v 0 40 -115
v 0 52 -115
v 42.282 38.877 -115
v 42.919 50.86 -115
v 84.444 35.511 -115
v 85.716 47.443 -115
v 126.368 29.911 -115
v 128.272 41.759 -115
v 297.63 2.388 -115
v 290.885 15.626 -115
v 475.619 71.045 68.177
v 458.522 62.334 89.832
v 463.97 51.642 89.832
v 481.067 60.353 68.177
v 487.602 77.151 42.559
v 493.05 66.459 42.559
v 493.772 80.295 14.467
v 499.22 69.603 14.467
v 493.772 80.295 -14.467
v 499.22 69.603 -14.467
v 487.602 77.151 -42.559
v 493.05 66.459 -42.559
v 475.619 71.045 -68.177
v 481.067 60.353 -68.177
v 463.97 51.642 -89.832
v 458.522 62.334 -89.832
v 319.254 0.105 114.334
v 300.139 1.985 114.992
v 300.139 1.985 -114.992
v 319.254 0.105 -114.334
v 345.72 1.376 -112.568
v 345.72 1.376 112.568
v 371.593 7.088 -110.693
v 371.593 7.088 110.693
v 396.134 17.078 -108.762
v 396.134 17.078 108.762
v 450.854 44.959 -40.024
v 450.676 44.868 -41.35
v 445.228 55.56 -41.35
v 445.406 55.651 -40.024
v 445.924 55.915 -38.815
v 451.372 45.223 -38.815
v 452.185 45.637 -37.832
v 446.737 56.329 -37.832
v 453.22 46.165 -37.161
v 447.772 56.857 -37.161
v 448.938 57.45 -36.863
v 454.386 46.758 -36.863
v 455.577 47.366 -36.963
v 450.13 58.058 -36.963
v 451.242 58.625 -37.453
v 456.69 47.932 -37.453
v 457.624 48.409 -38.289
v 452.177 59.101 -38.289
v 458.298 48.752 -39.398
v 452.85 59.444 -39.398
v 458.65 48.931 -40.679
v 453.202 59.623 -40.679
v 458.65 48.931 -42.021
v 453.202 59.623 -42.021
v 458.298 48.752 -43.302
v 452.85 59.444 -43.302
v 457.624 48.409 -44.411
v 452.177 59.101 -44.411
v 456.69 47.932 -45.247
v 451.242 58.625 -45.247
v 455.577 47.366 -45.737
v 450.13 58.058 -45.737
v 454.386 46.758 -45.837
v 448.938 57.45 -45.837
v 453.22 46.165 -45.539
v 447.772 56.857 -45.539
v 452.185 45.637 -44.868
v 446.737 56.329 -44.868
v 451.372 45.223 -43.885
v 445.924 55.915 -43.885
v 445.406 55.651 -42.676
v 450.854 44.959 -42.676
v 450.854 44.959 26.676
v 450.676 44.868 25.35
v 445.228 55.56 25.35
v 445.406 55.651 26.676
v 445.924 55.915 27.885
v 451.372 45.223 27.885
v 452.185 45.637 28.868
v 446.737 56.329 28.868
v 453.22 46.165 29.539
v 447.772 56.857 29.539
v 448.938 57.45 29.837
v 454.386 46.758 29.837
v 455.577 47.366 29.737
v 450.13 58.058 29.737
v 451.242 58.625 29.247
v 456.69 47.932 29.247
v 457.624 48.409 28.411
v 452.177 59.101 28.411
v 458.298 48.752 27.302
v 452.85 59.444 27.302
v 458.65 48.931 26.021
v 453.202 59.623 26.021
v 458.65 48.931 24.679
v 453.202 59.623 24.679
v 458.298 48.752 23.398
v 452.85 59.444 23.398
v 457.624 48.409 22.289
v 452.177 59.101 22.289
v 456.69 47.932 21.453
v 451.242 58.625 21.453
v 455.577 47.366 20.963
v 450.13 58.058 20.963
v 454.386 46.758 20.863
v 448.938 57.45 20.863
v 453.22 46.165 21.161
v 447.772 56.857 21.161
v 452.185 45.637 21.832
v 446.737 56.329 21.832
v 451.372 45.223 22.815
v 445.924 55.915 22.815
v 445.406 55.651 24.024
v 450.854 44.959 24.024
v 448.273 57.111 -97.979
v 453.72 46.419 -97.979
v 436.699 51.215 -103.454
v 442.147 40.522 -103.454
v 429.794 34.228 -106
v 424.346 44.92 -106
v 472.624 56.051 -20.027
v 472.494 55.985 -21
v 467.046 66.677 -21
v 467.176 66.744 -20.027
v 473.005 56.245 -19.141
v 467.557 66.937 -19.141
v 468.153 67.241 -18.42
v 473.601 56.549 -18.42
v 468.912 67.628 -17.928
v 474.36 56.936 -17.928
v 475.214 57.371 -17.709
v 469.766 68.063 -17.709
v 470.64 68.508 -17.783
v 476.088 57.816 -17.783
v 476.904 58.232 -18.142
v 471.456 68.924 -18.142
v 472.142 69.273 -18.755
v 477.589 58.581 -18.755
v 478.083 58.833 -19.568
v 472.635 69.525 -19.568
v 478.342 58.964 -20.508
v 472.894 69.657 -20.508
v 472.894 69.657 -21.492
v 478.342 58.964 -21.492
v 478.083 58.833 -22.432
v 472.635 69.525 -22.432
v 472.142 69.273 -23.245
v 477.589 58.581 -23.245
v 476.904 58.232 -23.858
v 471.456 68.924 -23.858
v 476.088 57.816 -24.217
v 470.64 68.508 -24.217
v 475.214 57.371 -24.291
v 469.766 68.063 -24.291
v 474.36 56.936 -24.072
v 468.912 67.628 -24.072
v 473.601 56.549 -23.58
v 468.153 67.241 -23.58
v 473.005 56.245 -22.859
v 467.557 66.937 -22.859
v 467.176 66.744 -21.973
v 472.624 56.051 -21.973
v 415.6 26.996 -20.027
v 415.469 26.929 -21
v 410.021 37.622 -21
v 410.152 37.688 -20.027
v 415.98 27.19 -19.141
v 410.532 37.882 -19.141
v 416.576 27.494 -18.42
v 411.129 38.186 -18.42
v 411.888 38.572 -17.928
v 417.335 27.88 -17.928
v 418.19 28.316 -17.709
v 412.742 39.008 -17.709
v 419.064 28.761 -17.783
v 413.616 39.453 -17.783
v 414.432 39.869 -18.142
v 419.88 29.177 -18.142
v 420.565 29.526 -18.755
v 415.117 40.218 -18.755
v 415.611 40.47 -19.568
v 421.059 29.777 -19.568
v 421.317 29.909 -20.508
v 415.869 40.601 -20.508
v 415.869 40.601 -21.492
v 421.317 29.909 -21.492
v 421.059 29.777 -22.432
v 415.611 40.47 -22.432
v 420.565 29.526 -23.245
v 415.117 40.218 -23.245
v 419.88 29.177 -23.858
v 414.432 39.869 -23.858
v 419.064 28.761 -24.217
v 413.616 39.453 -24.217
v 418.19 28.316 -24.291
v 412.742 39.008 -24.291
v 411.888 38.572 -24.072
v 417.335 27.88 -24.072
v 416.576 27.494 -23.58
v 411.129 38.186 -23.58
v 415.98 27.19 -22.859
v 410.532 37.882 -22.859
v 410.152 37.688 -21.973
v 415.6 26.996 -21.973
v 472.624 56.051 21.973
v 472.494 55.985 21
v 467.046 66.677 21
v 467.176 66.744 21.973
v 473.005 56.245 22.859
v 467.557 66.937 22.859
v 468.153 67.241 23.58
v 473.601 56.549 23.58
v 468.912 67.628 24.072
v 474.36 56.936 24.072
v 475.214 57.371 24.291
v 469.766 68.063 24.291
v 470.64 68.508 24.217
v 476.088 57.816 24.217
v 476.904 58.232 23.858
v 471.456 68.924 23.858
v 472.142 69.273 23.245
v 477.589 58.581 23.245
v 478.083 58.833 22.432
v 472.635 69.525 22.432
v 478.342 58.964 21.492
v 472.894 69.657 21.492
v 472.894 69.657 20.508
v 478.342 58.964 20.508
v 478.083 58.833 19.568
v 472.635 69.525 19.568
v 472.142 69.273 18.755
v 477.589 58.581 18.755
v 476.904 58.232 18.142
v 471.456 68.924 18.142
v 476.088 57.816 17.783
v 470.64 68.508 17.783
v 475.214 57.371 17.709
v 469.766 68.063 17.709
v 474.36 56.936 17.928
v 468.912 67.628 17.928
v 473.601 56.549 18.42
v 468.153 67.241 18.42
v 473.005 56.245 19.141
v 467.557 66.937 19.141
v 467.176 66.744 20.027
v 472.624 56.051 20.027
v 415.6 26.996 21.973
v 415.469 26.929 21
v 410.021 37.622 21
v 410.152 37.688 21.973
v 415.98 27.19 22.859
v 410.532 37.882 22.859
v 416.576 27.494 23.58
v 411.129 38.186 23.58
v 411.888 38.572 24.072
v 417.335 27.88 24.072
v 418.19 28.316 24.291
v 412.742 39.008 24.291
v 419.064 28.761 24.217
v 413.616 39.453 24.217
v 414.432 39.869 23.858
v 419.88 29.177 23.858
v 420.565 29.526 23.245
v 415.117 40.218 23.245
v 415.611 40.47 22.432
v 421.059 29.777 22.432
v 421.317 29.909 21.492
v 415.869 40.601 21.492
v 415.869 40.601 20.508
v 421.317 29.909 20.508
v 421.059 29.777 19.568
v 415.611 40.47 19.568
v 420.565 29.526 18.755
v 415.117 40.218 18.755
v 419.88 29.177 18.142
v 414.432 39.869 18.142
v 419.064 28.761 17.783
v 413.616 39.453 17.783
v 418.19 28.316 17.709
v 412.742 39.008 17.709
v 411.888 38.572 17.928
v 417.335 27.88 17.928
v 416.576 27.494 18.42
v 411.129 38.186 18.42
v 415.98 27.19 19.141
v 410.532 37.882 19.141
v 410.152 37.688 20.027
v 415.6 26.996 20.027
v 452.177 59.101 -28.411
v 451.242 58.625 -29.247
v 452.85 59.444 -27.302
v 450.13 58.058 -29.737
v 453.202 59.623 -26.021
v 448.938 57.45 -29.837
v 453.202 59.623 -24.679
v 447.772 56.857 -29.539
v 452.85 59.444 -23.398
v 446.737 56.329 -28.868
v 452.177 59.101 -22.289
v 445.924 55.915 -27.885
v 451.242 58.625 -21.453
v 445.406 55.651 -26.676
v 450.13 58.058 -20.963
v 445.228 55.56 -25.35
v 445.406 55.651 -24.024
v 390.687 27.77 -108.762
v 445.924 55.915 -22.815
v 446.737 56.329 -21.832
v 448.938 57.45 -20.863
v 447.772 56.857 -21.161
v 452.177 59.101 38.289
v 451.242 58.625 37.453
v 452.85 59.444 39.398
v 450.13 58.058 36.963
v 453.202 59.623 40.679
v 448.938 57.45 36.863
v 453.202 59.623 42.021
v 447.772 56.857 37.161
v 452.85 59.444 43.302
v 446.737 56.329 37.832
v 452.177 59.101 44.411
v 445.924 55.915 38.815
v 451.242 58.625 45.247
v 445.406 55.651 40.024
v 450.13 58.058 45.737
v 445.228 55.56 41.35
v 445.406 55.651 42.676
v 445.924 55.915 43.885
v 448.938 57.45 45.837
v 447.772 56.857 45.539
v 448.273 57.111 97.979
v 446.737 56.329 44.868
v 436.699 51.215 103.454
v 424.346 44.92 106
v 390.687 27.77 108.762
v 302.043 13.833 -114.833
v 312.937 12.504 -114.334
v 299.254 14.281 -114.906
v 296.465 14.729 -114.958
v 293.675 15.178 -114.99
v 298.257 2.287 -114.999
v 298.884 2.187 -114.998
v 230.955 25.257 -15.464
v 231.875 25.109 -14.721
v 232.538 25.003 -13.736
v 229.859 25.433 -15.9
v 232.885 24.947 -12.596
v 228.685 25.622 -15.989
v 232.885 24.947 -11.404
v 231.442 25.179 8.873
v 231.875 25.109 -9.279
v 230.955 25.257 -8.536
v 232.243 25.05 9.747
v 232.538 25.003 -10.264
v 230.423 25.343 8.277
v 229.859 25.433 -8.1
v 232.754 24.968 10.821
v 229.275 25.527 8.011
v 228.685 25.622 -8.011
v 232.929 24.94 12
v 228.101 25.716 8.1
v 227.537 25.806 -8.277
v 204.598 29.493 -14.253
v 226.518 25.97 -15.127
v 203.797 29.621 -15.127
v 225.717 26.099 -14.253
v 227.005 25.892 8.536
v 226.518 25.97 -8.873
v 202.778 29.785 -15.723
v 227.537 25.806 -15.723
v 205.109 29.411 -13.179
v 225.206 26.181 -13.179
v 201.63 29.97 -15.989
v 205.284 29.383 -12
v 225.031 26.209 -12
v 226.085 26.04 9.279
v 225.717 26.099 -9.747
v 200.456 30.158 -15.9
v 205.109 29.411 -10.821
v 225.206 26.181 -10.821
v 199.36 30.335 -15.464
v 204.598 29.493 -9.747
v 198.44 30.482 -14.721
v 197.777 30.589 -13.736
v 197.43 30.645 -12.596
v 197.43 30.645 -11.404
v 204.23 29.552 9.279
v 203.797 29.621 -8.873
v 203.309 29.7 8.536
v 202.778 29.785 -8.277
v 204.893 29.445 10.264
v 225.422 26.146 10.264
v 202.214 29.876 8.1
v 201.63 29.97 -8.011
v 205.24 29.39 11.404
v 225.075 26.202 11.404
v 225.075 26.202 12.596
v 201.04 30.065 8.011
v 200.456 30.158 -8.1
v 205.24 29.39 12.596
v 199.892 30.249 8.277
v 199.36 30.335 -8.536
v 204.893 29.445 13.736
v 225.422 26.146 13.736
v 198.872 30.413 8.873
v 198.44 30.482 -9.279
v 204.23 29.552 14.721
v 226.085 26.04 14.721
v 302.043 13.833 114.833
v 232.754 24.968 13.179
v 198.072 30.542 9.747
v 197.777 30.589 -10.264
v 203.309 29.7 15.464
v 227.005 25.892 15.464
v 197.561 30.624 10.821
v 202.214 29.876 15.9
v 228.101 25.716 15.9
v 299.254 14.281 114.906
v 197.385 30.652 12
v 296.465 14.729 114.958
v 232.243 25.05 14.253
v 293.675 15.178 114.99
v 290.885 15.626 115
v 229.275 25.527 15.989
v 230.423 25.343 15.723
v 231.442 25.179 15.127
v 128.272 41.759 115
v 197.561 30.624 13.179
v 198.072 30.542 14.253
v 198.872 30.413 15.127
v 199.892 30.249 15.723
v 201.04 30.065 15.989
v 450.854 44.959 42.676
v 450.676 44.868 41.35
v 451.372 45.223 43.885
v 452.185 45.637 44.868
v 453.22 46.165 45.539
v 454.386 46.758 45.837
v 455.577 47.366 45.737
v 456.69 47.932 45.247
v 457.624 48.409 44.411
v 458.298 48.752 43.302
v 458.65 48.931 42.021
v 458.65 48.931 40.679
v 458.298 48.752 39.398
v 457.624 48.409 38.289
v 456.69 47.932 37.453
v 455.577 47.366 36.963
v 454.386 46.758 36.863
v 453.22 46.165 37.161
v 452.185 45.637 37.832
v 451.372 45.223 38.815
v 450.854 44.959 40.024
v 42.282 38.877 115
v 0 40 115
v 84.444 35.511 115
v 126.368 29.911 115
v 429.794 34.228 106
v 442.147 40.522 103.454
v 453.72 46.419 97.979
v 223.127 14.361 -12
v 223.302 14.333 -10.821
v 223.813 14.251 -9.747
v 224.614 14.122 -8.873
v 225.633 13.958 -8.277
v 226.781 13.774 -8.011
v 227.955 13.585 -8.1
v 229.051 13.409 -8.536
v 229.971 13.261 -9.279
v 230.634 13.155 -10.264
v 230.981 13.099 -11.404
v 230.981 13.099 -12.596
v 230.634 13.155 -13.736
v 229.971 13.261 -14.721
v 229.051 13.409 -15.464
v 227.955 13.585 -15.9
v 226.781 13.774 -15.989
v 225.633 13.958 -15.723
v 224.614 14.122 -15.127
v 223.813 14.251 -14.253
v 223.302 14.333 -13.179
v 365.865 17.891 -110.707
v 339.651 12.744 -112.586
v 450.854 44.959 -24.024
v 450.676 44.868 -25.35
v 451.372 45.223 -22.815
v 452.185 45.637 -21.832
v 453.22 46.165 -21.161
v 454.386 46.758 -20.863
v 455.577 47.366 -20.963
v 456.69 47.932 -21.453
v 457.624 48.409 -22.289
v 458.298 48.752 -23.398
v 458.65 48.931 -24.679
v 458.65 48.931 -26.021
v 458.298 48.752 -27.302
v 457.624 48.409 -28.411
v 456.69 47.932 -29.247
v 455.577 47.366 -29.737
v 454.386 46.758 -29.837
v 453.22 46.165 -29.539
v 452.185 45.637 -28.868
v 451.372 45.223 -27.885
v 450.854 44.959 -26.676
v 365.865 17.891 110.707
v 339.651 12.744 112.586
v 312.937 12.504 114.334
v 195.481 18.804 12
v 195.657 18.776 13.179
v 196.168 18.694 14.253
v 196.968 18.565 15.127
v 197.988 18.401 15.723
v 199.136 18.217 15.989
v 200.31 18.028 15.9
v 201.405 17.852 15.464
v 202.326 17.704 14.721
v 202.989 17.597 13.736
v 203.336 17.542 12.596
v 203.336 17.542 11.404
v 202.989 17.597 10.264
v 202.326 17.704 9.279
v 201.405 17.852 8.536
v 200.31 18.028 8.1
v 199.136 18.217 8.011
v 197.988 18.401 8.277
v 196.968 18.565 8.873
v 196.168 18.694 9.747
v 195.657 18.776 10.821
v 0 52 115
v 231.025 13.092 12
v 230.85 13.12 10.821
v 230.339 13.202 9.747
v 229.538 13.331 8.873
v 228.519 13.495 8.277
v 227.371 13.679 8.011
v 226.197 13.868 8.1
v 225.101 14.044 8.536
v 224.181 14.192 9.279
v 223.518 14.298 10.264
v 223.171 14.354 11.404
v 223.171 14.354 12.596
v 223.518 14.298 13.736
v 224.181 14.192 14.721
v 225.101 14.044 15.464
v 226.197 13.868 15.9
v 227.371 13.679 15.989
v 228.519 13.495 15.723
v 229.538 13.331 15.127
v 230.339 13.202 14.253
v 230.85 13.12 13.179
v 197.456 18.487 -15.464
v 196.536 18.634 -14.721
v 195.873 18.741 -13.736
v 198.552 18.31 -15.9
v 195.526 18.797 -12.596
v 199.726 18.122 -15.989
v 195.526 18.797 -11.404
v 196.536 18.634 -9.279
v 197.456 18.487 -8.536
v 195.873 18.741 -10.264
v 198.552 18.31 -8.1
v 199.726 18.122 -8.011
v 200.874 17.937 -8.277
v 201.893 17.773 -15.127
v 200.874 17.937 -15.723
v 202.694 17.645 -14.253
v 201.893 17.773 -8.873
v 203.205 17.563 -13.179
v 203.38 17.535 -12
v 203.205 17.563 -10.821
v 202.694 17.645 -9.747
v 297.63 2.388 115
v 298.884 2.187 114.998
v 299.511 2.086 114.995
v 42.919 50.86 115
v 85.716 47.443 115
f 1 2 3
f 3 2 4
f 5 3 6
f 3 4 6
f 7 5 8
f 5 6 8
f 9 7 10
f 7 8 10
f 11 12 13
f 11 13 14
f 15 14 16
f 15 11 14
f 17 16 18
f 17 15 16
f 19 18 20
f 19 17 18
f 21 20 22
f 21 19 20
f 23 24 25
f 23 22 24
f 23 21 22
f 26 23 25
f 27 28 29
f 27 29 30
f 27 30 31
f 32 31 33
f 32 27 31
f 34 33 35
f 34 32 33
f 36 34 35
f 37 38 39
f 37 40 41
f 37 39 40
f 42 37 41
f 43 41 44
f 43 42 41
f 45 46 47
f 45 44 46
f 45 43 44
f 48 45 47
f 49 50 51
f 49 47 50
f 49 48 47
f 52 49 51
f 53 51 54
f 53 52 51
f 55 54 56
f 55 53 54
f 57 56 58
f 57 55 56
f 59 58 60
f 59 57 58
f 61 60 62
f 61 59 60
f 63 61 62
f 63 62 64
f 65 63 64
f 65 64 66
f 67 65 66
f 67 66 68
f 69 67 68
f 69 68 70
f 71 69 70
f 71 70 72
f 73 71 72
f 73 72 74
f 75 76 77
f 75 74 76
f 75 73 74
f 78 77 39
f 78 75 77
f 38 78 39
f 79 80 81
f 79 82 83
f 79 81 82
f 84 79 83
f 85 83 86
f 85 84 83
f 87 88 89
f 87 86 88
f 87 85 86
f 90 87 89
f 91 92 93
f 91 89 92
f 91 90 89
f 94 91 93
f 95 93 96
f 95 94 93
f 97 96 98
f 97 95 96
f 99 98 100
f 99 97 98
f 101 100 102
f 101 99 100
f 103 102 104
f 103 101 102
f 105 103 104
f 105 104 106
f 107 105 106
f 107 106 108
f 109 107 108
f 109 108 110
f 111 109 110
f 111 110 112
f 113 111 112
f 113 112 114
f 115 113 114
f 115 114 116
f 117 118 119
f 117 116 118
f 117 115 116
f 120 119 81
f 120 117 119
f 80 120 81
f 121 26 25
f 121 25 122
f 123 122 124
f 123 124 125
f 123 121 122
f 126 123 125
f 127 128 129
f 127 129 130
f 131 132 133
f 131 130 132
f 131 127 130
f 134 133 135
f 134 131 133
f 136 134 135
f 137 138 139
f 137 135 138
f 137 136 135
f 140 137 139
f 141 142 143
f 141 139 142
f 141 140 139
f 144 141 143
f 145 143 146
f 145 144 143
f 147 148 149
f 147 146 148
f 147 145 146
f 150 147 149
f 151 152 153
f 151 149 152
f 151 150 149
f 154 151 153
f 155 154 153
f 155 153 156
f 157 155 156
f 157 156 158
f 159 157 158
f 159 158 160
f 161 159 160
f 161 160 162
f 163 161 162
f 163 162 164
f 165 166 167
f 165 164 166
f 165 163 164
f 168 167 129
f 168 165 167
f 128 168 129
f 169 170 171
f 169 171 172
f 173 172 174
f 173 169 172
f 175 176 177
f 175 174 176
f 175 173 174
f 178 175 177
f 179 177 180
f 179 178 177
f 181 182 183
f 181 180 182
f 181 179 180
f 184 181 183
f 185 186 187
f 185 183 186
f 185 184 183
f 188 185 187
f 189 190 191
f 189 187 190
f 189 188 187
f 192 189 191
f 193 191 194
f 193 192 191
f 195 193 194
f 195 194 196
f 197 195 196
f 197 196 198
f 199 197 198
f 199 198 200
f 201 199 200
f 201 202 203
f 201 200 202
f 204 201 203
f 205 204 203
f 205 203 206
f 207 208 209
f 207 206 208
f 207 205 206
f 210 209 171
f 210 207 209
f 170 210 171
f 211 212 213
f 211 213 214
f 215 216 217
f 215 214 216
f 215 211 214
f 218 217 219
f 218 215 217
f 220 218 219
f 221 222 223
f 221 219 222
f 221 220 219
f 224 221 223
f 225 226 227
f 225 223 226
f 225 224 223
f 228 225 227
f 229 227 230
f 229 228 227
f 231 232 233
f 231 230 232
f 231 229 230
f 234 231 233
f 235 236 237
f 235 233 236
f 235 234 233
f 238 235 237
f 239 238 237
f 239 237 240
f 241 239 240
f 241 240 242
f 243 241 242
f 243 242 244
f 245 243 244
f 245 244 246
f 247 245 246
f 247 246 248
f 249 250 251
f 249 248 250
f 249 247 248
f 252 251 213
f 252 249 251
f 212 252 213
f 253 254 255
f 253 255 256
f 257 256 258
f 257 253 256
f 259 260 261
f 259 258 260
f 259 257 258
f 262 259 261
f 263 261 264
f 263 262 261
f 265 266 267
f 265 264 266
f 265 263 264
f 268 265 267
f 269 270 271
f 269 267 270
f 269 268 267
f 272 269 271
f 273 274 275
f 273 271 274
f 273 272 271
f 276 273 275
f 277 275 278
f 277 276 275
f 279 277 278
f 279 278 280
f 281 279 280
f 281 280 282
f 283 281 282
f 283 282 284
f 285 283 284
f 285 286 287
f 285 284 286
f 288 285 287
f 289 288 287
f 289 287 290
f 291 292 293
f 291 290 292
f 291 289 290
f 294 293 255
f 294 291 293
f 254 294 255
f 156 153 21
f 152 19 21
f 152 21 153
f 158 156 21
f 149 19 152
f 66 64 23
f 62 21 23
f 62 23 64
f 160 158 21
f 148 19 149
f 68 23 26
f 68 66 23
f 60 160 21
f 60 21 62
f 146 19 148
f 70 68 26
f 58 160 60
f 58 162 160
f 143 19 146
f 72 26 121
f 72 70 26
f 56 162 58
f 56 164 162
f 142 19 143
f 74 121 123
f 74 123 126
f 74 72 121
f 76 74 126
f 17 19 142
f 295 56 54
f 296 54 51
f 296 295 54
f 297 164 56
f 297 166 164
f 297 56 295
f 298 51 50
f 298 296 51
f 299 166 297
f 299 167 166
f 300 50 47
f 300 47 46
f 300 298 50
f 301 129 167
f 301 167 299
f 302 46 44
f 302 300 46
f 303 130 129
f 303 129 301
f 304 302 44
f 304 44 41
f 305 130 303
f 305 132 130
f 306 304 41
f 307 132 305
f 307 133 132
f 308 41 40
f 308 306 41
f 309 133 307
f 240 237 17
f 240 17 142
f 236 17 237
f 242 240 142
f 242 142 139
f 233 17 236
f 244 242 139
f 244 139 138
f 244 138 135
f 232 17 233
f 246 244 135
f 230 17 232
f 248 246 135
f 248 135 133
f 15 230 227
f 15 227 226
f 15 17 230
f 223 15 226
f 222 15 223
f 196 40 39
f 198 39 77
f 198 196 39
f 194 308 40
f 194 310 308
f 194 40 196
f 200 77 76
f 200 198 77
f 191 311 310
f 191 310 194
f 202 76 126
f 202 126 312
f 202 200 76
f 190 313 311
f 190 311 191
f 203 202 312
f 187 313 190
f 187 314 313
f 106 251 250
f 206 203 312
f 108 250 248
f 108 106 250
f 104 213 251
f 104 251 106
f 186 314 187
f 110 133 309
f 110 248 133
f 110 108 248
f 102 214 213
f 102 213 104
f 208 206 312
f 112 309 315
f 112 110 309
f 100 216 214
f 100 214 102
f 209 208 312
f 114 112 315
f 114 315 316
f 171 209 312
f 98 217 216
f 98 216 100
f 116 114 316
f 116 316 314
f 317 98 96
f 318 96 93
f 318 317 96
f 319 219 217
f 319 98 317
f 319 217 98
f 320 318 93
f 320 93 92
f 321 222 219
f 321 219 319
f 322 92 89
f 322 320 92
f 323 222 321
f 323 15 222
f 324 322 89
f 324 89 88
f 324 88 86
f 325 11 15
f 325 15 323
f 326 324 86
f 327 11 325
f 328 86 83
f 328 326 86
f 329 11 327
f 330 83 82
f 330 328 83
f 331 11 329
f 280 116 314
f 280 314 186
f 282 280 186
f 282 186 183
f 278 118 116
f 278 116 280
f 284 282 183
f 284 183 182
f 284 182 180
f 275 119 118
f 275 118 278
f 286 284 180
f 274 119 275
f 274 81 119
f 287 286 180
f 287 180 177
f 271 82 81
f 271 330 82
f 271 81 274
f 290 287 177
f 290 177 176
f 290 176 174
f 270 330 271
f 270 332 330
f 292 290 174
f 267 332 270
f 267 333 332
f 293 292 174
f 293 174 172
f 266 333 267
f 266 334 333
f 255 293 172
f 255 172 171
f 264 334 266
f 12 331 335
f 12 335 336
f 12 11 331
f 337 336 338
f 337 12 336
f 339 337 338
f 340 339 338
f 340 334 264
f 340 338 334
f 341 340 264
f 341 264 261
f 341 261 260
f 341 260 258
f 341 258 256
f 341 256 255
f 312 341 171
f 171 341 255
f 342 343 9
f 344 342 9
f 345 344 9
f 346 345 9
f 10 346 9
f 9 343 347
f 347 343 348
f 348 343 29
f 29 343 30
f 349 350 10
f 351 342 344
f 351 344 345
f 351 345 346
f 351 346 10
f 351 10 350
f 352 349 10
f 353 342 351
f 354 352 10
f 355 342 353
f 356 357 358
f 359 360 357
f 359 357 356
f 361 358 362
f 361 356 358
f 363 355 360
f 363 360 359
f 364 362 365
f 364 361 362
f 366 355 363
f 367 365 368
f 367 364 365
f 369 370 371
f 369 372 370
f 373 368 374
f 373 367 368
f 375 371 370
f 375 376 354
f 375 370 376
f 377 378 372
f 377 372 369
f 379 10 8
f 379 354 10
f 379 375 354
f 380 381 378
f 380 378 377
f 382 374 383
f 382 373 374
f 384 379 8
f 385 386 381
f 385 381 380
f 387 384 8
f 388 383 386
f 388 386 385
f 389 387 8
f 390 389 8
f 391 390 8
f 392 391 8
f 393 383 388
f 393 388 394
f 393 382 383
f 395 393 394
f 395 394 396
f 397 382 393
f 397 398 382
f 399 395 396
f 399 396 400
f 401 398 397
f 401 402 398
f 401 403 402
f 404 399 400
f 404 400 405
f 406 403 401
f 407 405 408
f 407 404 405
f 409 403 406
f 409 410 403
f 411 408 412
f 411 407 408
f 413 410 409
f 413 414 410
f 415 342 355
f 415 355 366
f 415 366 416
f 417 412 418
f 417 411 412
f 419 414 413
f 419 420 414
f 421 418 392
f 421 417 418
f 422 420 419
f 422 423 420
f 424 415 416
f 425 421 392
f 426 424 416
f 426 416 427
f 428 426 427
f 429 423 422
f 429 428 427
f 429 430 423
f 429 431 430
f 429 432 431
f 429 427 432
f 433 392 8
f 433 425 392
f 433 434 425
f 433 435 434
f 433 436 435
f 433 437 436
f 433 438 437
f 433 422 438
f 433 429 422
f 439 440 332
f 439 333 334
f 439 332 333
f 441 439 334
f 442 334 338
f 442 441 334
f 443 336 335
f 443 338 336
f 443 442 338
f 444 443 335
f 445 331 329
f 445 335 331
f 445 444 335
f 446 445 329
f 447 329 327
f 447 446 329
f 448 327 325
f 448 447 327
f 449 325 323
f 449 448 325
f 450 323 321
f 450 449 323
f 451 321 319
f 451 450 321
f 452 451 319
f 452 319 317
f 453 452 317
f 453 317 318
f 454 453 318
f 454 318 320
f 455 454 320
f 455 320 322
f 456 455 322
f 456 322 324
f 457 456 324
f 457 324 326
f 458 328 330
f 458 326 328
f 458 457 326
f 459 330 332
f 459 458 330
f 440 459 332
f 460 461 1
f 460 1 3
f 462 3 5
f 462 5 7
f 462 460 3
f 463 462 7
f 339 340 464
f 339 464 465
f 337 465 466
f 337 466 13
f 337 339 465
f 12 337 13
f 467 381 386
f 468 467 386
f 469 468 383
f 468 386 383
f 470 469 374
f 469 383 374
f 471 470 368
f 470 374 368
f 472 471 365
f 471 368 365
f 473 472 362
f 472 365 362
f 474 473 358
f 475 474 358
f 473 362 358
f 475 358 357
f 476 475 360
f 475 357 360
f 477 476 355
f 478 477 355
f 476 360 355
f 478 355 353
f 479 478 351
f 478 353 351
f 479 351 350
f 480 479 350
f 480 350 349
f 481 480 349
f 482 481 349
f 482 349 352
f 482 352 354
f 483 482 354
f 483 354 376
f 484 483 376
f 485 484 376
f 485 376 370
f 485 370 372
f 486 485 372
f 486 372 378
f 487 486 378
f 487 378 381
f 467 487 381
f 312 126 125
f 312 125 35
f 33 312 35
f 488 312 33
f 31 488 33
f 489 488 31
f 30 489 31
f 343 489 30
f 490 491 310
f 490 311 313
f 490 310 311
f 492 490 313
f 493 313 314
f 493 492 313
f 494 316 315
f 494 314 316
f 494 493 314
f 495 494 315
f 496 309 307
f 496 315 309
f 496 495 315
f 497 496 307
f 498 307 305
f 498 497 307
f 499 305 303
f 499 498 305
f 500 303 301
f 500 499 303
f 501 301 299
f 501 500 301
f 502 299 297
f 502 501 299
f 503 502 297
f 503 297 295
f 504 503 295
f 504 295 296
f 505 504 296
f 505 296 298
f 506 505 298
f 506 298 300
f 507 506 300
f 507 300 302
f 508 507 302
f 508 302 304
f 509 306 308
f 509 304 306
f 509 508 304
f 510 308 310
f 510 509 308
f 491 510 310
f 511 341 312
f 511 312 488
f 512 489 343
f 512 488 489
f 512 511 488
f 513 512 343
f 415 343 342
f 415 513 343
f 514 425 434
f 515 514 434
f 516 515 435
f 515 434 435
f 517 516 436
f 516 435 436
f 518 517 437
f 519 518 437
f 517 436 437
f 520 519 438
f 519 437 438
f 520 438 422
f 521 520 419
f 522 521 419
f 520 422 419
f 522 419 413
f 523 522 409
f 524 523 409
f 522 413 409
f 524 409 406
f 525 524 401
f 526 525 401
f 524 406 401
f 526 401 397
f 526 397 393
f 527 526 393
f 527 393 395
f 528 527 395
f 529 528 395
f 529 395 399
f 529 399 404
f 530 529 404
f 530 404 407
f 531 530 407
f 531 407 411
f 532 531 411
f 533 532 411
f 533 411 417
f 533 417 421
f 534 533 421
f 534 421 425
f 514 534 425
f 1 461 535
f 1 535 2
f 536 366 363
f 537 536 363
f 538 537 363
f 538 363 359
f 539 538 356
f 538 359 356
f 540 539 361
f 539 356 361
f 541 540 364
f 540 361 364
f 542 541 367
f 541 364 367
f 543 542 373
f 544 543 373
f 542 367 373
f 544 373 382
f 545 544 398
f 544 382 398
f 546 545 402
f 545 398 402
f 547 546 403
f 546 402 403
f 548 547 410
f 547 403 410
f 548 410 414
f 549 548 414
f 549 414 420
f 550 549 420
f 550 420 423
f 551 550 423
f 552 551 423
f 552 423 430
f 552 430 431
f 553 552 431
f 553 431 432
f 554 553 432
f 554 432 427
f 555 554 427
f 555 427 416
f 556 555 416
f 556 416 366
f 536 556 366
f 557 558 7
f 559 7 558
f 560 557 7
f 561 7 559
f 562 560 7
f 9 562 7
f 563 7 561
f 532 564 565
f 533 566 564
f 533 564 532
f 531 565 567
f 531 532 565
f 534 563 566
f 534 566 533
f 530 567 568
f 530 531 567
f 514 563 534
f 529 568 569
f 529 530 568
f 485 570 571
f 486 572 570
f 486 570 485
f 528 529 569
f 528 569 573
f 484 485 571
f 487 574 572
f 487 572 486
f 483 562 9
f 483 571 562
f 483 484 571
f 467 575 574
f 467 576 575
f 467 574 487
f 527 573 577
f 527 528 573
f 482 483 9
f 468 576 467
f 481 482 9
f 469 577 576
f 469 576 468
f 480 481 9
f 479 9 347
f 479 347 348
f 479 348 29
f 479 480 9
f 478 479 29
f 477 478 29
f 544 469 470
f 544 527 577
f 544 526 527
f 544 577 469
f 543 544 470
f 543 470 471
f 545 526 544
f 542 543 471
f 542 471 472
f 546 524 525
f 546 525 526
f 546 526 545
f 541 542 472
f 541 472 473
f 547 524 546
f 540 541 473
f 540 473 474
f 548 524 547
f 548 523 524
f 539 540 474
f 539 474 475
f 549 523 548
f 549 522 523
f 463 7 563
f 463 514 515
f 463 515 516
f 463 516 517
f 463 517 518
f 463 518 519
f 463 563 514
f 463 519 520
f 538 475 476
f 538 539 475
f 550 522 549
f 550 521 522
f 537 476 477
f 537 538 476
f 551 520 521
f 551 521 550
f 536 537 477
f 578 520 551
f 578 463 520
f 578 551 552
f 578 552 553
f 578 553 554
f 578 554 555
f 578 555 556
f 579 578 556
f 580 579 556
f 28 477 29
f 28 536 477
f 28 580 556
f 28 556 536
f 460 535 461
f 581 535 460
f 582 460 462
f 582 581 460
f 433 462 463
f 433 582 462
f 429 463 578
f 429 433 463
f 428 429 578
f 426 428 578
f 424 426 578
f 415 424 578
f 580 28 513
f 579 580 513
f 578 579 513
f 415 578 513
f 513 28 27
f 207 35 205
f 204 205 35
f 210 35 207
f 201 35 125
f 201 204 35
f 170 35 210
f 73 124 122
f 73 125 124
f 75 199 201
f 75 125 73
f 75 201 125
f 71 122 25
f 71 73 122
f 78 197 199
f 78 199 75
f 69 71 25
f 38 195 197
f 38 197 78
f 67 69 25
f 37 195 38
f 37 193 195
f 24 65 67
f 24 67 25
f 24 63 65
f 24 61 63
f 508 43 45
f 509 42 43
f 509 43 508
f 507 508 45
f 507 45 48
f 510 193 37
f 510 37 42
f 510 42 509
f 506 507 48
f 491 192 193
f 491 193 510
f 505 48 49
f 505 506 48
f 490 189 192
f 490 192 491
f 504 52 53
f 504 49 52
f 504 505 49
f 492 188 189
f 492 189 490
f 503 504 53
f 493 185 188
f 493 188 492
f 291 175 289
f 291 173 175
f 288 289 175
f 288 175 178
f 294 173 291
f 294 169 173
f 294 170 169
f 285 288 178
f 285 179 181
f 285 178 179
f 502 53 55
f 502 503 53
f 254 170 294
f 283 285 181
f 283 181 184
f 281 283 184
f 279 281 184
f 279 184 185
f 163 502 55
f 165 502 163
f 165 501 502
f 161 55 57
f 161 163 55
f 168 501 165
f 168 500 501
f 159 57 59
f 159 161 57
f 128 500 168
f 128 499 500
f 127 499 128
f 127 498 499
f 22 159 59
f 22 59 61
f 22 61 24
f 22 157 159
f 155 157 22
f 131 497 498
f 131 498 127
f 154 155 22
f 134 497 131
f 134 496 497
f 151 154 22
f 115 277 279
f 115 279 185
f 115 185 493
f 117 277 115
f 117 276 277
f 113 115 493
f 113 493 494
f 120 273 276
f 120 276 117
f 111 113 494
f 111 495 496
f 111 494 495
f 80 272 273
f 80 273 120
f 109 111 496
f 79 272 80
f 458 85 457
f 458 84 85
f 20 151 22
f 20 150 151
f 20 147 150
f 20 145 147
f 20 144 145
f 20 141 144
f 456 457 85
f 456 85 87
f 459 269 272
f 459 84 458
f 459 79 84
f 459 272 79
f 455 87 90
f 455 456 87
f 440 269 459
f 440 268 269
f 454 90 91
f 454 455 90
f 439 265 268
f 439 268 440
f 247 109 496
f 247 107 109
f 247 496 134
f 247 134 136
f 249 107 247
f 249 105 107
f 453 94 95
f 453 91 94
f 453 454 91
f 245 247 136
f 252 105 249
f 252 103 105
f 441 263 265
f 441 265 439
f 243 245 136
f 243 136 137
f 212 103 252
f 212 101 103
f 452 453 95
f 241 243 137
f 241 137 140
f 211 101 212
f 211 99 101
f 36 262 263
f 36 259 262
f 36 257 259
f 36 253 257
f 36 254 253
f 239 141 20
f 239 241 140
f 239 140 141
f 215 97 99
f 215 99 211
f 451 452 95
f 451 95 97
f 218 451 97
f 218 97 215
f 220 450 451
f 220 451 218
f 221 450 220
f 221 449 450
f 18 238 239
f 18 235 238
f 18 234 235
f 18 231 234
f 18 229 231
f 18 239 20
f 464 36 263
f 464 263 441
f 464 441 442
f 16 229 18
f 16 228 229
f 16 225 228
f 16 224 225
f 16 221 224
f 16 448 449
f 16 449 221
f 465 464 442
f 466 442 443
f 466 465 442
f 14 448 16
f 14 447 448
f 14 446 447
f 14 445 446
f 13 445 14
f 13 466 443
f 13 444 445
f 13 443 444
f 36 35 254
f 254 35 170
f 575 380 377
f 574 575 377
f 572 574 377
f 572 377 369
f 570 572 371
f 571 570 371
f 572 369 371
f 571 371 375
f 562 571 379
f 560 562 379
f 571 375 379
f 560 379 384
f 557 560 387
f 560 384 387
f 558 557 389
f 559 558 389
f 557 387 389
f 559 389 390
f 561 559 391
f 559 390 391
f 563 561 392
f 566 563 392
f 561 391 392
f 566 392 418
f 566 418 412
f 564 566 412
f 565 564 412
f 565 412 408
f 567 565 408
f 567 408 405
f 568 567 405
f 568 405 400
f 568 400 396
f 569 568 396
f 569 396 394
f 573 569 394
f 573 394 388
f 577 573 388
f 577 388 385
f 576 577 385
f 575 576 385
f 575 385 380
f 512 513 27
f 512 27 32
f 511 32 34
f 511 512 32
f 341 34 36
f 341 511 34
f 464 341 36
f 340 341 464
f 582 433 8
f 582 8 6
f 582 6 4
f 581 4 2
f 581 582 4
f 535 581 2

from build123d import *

# Parameters (mm, degrees)
EXTRUDE_THIN1_DEPTH  = 115
CUT_EXTRUDE1_DEPTH   = 620.892995583
FILLET1_R            = 250
SKETCH3_R            = 4
BINDING_HOLES_DEPTH  = 527.107084161
SKETCH4_R            = 4
CUT_EXTRUDE2_DEPTH   = 947.891927405
M6_CLEARANCE_HOLE1_D = 6.6
M8_CLEARANCE_HOLE1_D = 9
SKETCH9_W            = 500
SKETCH9_H            = 230
CUT_EXTRUDE3_DEPTH   = 520.361349661


with BuildPart() as part:
    # Sketch1 → Extrude-Thin1 (new, symmetric)
    with BuildSketch(Plane.XY):
        with BuildLine():
            Line((-500, 70), (-396.134492808, 17.077880761))
            ThreePointArc((-396.134492808, 17.077880761), (-349.336150967, 1.90144375), (-300.138569045, 1.984944587))
            Line((-300.138569045, 1.984944587), (-126.368172253, 29.91072477))
            ThreePointArc((-126.368172253, 29.91072477), (0, 40), (126.368172253, 29.91072477))
            Line((126.368172253, 29.91072477), (300.138569045, 1.984944587))
            ThreePointArc((300.138569045, 1.984944587), (349.336150967, 1.90144375), (396.134492808, 17.077880761))
            Line((396.134492808, 17.077880761), (500, 70))
            Line((500, 70), (494.552114003, 80.69207829))
            Line((494.552114003, 80.69207829), (390.686606812, 27.769959051))
            ThreePointArc((390.686606812, 27.769959051), (347.472349444, 13.755820321), (302.042599512, 13.832926187))
            Line((302.042599512, 13.832926187), (128.27220272, 41.75870637))
            ThreePointArc((128.27220272, 41.75870637), (0, 52), (-128.27220272, 41.75870637))
            Line((-128.27220272, 41.75870637), (-302.042599512, 13.832926187))
            ThreePointArc((-302.042599512, 13.832926187), (-347.472349444, 13.755820321), (-390.686606812, 27.769959051))
            Line((-390.686606812, 27.769959051), (-494.552114003, 80.69207829))
            Line((-494.552114003, 80.69207829), (-500, 70))
        make_face()
    extrude(amount=EXTRUDE_THIN1_DEPTH, both=True)

    # Sketch2 → Cut-Extrude1 (cut, symmetric)
    with BuildSketch(Plane(origin=(-69.290206127, -135.989686473, 0), x_dir=(-0.8910065241883677, 0.4539904997395473, 0), z_dir=(0.45399049973954725, 0.8910065241883676, 0))):
        with BuildLine():
            Line((-1243.954382633, 226.09395148), (275.40194382, 115))
            Line((275.40194382, 115), (398.488815391, 106))
            ThreePointArc((398.488815391, 106), (418.996120575, 101.069384919), (436.845066451, 89.8321405))
            ThreePointArc((436.845066451, 89.8321405), (477.282597076, 0), (436.845066451, -89.8321405))
            ThreePointArc((436.845066451, -89.8321405), (418.996120575, -101.069384919), (398.488815391, -106))
            Line((398.488815391, -106), (275.40194382, -115))
            Line((275.40194382, -115), (-1243.954382633, -226.09395148))
            Line((-1243.954382633, -226.09395148), (1802.870530478, -226.09395148))
            Line((1802.870530478, -226.09395148), (1802.870530478, 226.09395148))
            Line((1802.870530478, 226.09395148), (-1243.954382633, 226.09395148))
        make_face()
    cut_extrude1 = extrude(amount=CUT_EXTRUDE1_DEPTH, both=True, mode=Mode.SUBTRACT)

    # Mirror1: Cut-Extrude1 across plane
    add(cut_extrude1.mirror(Plane(origin=(0, 0, 0), x_dir=(0, 0, 1), z_dir=(1, 0, 0))), mode=Mode.SUBTRACT)

    # Fillet1
    # the kernel refuses this fillet: 250 mm, written as the material it takes off along each edge
    with BuildSketch(Plane(origin=(-319.014996724, -19.477278886, 115), x_dir=(-0.8886341933277065, 0.4527817367914195, -0.07292440796442752), z_dir=(0.45399049973954736, 0.8910065241883677, 0))) as fillet1_piece_1:
        with BuildLine():
            CenterArc((FILLET1_R * 0.0365108095299, -FILLET1_R), FILLET1_R, 90, 4.181973001)
            Line((-FILLET1_R * 0.0364135984345, -FILLET1_R * 0.00266252916927), (-FILLET1_R * 0.0378720865938, FILLET1_R * 0.0172842202473))
            Line((-FILLET1_R * 0.0378720865938, FILLET1_R * 0.0172842202473), (-FILLET1_R * 0.000730216190598, FILLET1_R * 0.02))
            Line((-FILLET1_R * 0.000730216190598, FILLET1_R * 0.02), (FILLET1_R * 0.0365108095299, FILLET1_R * 0.02))
            Line((FILLET1_R * 0.0365108095299, FILLET1_R * 0.02), (FILLET1_R * 0.0365108095299, 0))
        make_face()
    extrude(amount=60.204173091, mode=Mode.SUBTRACT)
    # the kernel refuses this fillet: 250 mm, written as the material it takes off along each edge
    with BuildSketch(Plane(origin=(319.014996724, -19.477278886, 115), x_dir=(-0.8910065241883677, -0.4539904997395473, 0), z_dir=(-0.45399049973954736, 0.8910065241883677, 0))) as fillet1_2_piece_1:
        with BuildLine():
            CenterArc((FILLET1_R * 0.0365108095299, -FILLET1_R), FILLET1_R, 90, 4.181973001)
            Line((-FILLET1_R * 0.0364135984345, -FILLET1_R * 0.00266252916927), (-FILLET1_R * 0.0378720865938, FILLET1_R * 0.0172842202473))
            Line((-FILLET1_R * 0.0378720865938, FILLET1_R * 0.0172842202473), (-FILLET1_R * 0.000730216190598, FILLET1_R * 0.02))
            Line((-FILLET1_R * 0.000730216190598, FILLET1_R * 0.02), (FILLET1_R * 0.0365108095299, FILLET1_R * 0.02))
            Line((FILLET1_R * 0.0365108095299, FILLET1_R * 0.02), (FILLET1_R * 0.0365108095299, 0))
        make_face()
    extrude(amount=60.204173091, mode=Mode.SUBTRACT)
    # the kernel refuses this fillet: 250 mm, written as the material it takes off along each edge
    with BuildSketch(Plane(origin=(-319.014996724, -19.477278886, -115), x_dir=(0.8910065241883677, -0.4539904997395473, 0), z_dir=(0.4539904997395473, 0.8910065241883677, 0))) as fillet1_3_piece_1:
        with BuildLine():
            CenterArc((FILLET1_R * 0.0365108095299, -FILLET1_R), FILLET1_R, 90, 4.181973001)
            Line((-FILLET1_R * 0.0364135984345, -FILLET1_R * 0.00266252916927), (-FILLET1_R * 0.0378720865938, FILLET1_R * 0.0172842202473))
            Line((-FILLET1_R * 0.0378720865938, FILLET1_R * 0.0172842202473), (-FILLET1_R * 0.000730216190598, FILLET1_R * 0.02))
            Line((-FILLET1_R * 0.000730216190598, FILLET1_R * 0.02), (FILLET1_R * 0.0365108095299, FILLET1_R * 0.02))
            Line((FILLET1_R * 0.0365108095299, FILLET1_R * 0.02), (FILLET1_R * 0.0365108095299, 0))
        make_face()
    extrude(amount=60.204173091, mode=Mode.SUBTRACT)
    # the kernel refuses this fillet: 250 mm, written as the material it takes off along each edge
    with BuildSketch(Plane(origin=(319.014996724, -19.477278886, -115), x_dir=(-0.8910065241883677, -0.4539904997395473, 0), z_dir=(-0.4539904997395473, 0.8910065241883677, 0))) as fillet1_4_piece_1:
        with BuildLine():
            CenterArc((FILLET1_R * 0.0365108095299, FILLET1_R), FILLET1_R, 265.818026999, 4.181973001)
            Line((-FILLET1_R * 0.0364135984345, FILLET1_R * 0.00266252916927), (-FILLET1_R * 0.0378720865938, -FILLET1_R * 0.0172842202473))
            Line((-FILLET1_R * 0.0378720865938, -FILLET1_R * 0.0172842202473), (-FILLET1_R * 0.000730216190598, -FILLET1_R * 0.02))
            Line((-FILLET1_R * 0.000730216190598, -FILLET1_R * 0.02), (FILLET1_R * 0.0365108095299, -FILLET1_R * 0.02))
            Line((FILLET1_R * 0.0365108095299, -FILLET1_R * 0.02), (FILLET1_R * 0.0365108095299, 0))
        make_face()
    extrude(amount=60.204173091, mode=Mode.SUBTRACT)

    # Sketch3 → Binding Holes (cut, through all)
    with BuildSketch(Plane(origin=(-9.771253847, 60.8024072, 0), x_dir=(-0.9873317999532861, -0.15866920558509276, 0), z_dir=(-0.15866920558509276, 0.9873317999532861, 0))):
        with Locations((222.02140403, 12)):
            Circle(SKETCH3_R)
        with Locations(Location((222.02140403, -12, 0), (0, 0, 180))):
            Circle(SKETCH3_R)
        with Locations((194.02140403, -12)):
            Circle(SKETCH3_R)
        with Locations(Location((194.02140403, 12, 0), (0, 0, 180))):
            Circle(SKETCH3_R)
    extrude(amount=-BINDING_HOLES_DEPTH, mode=Mode.SUBTRACT)

    # Sketch4 → Cut-Extrude2 (cut, through all)
    with BuildSketch(Plane(origin=(430.771006706, -6.854378838, -35.350500744), x_dir=(-0.9873317999532861, 0.15866920558509276, 0), z_dir=(0.15866920558509276, 0.9873317999532861, 0))):
        with Locations((232.380088234, 47.350500744)):
            Circle(SKETCH4_R)
        with Locations(Location((232.380088234, 23.350500744, 0), (0, 0, 180))):
            Circle(SKETCH4_R)
        with Locations((204.380088234, 23.350500744)):
            Circle(SKETCH4_R)
        with Locations(Location((204.380088234, 47.350500744, 0), (0, 0, 180))):
            Circle(SKETCH4_R)
    extrude(amount=-CUT_EXTRUDE2_DEPTH, mode=Mode.SUBTRACT)

    # M6 Clearance Hole1 (through all)
    with Locations(Plane(origin=(-49.331097603, -146.159360215, -63.345400331), x_dir=(-0.8910065241883677, 0.4539904997395473, 0), z_dir=(0.45399049973954725, 0.8910065241883676, 0))):
        with Locations((472.112244346, 84.345400331), (408.112244346, 84.345400331), (408.112244346, 42.345400331), (472.112244346, 42.345400331)):
            m6_clearance_hole1 = Hole(M6_CLEARANCE_HOLE1_D / 2)

    # M8 Clearance Hole1 (through all)
    with Locations(Plane(origin=(-70.616279149, -135.31401852, -54.210944478), x_dir=(-0.8910065241883677, 0.4539904997395473, 0), z_dir=(0.45399049973954725, 0.8910065241883676, 0))):
        with Locations((424.936326624, 95.560944478), (424.936326624, 79.560944478), (424.936326624, 12.860944478), (424.936326624, 28.860944478)):
            m8_clearance_hole1 = Hole(M8_CLEARANCE_HOLE1_D / 2)

    # Mirror2: M6 Clearance Hole1, M8 Clearance Hole1 across plane
    add(m6_clearance_hole1.mirror(Plane(origin=(0, 0, 0), x_dir=(0, 0, 1), z_dir=(1, 0, 0))), mode=Mode.SUBTRACT)
    add(m8_clearance_hole1.mirror(Plane(origin=(0, 0, 0), x_dir=(0, 0, 1), z_dir=(1, 0, 0))), mode=Mode.SUBTRACT)

    # Sketch9 → Cut-Extrude3 (cut, through all)
    with BuildSketch(Plane(origin=(0, 0, 0), x_dir=(1, 0, 0), z_dir=(0, 1, 0))):
        with Locations((-250, 0)):
            Rectangle(SKETCH9_W, SKETCH9_H)
    extrude(amount=CUT_EXTRUDE3_DEPTH, mode=Mode.SUBTRACT)


solid = part.part
